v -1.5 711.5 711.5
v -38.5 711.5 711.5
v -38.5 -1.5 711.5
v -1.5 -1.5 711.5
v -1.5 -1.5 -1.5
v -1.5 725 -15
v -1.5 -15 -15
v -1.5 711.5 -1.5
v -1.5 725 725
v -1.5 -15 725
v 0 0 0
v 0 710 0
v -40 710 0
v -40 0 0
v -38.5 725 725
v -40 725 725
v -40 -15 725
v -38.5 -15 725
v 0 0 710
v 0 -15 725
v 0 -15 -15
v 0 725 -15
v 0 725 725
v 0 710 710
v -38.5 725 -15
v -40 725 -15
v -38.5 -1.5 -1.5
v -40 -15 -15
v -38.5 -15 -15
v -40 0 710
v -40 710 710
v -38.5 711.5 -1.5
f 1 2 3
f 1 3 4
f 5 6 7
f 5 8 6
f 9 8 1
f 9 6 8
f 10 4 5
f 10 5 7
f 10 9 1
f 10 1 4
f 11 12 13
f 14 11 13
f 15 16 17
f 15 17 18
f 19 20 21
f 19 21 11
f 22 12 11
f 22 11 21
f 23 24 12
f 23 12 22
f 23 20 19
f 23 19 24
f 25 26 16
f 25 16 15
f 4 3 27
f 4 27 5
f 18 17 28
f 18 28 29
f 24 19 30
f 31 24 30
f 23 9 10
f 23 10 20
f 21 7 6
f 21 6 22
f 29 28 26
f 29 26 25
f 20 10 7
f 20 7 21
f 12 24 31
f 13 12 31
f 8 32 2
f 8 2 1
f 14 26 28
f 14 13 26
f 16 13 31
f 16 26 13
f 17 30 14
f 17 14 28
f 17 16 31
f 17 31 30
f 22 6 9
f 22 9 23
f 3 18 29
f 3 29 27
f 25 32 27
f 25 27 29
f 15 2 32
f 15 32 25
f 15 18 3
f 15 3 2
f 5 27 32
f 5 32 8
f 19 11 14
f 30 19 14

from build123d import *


with BuildPart() as f2:
    # F2: sweep along a path in F1
    with BuildLine(Plane.YZ) as f2_path:
        Line((0, 0), (0, 710))
        Line((0, 710), (710, 710))
        Line((710, 710), (710, 0))
        Line((710, 0), (0, 0))
    # F0 (on Top) → F2 (sweep)
    with BuildSketch(Plane.XY):
        Polygon((0, -15), (0, 0), (-40, 0), (-40, -15), (-38.5, -15), (-38.5, -1.5), (-1.5, -1.5), (-1.5, -15), align=None)
    sweep(path=f2_path.line, transition=Transition.RIGHT)


solid = f2.part
